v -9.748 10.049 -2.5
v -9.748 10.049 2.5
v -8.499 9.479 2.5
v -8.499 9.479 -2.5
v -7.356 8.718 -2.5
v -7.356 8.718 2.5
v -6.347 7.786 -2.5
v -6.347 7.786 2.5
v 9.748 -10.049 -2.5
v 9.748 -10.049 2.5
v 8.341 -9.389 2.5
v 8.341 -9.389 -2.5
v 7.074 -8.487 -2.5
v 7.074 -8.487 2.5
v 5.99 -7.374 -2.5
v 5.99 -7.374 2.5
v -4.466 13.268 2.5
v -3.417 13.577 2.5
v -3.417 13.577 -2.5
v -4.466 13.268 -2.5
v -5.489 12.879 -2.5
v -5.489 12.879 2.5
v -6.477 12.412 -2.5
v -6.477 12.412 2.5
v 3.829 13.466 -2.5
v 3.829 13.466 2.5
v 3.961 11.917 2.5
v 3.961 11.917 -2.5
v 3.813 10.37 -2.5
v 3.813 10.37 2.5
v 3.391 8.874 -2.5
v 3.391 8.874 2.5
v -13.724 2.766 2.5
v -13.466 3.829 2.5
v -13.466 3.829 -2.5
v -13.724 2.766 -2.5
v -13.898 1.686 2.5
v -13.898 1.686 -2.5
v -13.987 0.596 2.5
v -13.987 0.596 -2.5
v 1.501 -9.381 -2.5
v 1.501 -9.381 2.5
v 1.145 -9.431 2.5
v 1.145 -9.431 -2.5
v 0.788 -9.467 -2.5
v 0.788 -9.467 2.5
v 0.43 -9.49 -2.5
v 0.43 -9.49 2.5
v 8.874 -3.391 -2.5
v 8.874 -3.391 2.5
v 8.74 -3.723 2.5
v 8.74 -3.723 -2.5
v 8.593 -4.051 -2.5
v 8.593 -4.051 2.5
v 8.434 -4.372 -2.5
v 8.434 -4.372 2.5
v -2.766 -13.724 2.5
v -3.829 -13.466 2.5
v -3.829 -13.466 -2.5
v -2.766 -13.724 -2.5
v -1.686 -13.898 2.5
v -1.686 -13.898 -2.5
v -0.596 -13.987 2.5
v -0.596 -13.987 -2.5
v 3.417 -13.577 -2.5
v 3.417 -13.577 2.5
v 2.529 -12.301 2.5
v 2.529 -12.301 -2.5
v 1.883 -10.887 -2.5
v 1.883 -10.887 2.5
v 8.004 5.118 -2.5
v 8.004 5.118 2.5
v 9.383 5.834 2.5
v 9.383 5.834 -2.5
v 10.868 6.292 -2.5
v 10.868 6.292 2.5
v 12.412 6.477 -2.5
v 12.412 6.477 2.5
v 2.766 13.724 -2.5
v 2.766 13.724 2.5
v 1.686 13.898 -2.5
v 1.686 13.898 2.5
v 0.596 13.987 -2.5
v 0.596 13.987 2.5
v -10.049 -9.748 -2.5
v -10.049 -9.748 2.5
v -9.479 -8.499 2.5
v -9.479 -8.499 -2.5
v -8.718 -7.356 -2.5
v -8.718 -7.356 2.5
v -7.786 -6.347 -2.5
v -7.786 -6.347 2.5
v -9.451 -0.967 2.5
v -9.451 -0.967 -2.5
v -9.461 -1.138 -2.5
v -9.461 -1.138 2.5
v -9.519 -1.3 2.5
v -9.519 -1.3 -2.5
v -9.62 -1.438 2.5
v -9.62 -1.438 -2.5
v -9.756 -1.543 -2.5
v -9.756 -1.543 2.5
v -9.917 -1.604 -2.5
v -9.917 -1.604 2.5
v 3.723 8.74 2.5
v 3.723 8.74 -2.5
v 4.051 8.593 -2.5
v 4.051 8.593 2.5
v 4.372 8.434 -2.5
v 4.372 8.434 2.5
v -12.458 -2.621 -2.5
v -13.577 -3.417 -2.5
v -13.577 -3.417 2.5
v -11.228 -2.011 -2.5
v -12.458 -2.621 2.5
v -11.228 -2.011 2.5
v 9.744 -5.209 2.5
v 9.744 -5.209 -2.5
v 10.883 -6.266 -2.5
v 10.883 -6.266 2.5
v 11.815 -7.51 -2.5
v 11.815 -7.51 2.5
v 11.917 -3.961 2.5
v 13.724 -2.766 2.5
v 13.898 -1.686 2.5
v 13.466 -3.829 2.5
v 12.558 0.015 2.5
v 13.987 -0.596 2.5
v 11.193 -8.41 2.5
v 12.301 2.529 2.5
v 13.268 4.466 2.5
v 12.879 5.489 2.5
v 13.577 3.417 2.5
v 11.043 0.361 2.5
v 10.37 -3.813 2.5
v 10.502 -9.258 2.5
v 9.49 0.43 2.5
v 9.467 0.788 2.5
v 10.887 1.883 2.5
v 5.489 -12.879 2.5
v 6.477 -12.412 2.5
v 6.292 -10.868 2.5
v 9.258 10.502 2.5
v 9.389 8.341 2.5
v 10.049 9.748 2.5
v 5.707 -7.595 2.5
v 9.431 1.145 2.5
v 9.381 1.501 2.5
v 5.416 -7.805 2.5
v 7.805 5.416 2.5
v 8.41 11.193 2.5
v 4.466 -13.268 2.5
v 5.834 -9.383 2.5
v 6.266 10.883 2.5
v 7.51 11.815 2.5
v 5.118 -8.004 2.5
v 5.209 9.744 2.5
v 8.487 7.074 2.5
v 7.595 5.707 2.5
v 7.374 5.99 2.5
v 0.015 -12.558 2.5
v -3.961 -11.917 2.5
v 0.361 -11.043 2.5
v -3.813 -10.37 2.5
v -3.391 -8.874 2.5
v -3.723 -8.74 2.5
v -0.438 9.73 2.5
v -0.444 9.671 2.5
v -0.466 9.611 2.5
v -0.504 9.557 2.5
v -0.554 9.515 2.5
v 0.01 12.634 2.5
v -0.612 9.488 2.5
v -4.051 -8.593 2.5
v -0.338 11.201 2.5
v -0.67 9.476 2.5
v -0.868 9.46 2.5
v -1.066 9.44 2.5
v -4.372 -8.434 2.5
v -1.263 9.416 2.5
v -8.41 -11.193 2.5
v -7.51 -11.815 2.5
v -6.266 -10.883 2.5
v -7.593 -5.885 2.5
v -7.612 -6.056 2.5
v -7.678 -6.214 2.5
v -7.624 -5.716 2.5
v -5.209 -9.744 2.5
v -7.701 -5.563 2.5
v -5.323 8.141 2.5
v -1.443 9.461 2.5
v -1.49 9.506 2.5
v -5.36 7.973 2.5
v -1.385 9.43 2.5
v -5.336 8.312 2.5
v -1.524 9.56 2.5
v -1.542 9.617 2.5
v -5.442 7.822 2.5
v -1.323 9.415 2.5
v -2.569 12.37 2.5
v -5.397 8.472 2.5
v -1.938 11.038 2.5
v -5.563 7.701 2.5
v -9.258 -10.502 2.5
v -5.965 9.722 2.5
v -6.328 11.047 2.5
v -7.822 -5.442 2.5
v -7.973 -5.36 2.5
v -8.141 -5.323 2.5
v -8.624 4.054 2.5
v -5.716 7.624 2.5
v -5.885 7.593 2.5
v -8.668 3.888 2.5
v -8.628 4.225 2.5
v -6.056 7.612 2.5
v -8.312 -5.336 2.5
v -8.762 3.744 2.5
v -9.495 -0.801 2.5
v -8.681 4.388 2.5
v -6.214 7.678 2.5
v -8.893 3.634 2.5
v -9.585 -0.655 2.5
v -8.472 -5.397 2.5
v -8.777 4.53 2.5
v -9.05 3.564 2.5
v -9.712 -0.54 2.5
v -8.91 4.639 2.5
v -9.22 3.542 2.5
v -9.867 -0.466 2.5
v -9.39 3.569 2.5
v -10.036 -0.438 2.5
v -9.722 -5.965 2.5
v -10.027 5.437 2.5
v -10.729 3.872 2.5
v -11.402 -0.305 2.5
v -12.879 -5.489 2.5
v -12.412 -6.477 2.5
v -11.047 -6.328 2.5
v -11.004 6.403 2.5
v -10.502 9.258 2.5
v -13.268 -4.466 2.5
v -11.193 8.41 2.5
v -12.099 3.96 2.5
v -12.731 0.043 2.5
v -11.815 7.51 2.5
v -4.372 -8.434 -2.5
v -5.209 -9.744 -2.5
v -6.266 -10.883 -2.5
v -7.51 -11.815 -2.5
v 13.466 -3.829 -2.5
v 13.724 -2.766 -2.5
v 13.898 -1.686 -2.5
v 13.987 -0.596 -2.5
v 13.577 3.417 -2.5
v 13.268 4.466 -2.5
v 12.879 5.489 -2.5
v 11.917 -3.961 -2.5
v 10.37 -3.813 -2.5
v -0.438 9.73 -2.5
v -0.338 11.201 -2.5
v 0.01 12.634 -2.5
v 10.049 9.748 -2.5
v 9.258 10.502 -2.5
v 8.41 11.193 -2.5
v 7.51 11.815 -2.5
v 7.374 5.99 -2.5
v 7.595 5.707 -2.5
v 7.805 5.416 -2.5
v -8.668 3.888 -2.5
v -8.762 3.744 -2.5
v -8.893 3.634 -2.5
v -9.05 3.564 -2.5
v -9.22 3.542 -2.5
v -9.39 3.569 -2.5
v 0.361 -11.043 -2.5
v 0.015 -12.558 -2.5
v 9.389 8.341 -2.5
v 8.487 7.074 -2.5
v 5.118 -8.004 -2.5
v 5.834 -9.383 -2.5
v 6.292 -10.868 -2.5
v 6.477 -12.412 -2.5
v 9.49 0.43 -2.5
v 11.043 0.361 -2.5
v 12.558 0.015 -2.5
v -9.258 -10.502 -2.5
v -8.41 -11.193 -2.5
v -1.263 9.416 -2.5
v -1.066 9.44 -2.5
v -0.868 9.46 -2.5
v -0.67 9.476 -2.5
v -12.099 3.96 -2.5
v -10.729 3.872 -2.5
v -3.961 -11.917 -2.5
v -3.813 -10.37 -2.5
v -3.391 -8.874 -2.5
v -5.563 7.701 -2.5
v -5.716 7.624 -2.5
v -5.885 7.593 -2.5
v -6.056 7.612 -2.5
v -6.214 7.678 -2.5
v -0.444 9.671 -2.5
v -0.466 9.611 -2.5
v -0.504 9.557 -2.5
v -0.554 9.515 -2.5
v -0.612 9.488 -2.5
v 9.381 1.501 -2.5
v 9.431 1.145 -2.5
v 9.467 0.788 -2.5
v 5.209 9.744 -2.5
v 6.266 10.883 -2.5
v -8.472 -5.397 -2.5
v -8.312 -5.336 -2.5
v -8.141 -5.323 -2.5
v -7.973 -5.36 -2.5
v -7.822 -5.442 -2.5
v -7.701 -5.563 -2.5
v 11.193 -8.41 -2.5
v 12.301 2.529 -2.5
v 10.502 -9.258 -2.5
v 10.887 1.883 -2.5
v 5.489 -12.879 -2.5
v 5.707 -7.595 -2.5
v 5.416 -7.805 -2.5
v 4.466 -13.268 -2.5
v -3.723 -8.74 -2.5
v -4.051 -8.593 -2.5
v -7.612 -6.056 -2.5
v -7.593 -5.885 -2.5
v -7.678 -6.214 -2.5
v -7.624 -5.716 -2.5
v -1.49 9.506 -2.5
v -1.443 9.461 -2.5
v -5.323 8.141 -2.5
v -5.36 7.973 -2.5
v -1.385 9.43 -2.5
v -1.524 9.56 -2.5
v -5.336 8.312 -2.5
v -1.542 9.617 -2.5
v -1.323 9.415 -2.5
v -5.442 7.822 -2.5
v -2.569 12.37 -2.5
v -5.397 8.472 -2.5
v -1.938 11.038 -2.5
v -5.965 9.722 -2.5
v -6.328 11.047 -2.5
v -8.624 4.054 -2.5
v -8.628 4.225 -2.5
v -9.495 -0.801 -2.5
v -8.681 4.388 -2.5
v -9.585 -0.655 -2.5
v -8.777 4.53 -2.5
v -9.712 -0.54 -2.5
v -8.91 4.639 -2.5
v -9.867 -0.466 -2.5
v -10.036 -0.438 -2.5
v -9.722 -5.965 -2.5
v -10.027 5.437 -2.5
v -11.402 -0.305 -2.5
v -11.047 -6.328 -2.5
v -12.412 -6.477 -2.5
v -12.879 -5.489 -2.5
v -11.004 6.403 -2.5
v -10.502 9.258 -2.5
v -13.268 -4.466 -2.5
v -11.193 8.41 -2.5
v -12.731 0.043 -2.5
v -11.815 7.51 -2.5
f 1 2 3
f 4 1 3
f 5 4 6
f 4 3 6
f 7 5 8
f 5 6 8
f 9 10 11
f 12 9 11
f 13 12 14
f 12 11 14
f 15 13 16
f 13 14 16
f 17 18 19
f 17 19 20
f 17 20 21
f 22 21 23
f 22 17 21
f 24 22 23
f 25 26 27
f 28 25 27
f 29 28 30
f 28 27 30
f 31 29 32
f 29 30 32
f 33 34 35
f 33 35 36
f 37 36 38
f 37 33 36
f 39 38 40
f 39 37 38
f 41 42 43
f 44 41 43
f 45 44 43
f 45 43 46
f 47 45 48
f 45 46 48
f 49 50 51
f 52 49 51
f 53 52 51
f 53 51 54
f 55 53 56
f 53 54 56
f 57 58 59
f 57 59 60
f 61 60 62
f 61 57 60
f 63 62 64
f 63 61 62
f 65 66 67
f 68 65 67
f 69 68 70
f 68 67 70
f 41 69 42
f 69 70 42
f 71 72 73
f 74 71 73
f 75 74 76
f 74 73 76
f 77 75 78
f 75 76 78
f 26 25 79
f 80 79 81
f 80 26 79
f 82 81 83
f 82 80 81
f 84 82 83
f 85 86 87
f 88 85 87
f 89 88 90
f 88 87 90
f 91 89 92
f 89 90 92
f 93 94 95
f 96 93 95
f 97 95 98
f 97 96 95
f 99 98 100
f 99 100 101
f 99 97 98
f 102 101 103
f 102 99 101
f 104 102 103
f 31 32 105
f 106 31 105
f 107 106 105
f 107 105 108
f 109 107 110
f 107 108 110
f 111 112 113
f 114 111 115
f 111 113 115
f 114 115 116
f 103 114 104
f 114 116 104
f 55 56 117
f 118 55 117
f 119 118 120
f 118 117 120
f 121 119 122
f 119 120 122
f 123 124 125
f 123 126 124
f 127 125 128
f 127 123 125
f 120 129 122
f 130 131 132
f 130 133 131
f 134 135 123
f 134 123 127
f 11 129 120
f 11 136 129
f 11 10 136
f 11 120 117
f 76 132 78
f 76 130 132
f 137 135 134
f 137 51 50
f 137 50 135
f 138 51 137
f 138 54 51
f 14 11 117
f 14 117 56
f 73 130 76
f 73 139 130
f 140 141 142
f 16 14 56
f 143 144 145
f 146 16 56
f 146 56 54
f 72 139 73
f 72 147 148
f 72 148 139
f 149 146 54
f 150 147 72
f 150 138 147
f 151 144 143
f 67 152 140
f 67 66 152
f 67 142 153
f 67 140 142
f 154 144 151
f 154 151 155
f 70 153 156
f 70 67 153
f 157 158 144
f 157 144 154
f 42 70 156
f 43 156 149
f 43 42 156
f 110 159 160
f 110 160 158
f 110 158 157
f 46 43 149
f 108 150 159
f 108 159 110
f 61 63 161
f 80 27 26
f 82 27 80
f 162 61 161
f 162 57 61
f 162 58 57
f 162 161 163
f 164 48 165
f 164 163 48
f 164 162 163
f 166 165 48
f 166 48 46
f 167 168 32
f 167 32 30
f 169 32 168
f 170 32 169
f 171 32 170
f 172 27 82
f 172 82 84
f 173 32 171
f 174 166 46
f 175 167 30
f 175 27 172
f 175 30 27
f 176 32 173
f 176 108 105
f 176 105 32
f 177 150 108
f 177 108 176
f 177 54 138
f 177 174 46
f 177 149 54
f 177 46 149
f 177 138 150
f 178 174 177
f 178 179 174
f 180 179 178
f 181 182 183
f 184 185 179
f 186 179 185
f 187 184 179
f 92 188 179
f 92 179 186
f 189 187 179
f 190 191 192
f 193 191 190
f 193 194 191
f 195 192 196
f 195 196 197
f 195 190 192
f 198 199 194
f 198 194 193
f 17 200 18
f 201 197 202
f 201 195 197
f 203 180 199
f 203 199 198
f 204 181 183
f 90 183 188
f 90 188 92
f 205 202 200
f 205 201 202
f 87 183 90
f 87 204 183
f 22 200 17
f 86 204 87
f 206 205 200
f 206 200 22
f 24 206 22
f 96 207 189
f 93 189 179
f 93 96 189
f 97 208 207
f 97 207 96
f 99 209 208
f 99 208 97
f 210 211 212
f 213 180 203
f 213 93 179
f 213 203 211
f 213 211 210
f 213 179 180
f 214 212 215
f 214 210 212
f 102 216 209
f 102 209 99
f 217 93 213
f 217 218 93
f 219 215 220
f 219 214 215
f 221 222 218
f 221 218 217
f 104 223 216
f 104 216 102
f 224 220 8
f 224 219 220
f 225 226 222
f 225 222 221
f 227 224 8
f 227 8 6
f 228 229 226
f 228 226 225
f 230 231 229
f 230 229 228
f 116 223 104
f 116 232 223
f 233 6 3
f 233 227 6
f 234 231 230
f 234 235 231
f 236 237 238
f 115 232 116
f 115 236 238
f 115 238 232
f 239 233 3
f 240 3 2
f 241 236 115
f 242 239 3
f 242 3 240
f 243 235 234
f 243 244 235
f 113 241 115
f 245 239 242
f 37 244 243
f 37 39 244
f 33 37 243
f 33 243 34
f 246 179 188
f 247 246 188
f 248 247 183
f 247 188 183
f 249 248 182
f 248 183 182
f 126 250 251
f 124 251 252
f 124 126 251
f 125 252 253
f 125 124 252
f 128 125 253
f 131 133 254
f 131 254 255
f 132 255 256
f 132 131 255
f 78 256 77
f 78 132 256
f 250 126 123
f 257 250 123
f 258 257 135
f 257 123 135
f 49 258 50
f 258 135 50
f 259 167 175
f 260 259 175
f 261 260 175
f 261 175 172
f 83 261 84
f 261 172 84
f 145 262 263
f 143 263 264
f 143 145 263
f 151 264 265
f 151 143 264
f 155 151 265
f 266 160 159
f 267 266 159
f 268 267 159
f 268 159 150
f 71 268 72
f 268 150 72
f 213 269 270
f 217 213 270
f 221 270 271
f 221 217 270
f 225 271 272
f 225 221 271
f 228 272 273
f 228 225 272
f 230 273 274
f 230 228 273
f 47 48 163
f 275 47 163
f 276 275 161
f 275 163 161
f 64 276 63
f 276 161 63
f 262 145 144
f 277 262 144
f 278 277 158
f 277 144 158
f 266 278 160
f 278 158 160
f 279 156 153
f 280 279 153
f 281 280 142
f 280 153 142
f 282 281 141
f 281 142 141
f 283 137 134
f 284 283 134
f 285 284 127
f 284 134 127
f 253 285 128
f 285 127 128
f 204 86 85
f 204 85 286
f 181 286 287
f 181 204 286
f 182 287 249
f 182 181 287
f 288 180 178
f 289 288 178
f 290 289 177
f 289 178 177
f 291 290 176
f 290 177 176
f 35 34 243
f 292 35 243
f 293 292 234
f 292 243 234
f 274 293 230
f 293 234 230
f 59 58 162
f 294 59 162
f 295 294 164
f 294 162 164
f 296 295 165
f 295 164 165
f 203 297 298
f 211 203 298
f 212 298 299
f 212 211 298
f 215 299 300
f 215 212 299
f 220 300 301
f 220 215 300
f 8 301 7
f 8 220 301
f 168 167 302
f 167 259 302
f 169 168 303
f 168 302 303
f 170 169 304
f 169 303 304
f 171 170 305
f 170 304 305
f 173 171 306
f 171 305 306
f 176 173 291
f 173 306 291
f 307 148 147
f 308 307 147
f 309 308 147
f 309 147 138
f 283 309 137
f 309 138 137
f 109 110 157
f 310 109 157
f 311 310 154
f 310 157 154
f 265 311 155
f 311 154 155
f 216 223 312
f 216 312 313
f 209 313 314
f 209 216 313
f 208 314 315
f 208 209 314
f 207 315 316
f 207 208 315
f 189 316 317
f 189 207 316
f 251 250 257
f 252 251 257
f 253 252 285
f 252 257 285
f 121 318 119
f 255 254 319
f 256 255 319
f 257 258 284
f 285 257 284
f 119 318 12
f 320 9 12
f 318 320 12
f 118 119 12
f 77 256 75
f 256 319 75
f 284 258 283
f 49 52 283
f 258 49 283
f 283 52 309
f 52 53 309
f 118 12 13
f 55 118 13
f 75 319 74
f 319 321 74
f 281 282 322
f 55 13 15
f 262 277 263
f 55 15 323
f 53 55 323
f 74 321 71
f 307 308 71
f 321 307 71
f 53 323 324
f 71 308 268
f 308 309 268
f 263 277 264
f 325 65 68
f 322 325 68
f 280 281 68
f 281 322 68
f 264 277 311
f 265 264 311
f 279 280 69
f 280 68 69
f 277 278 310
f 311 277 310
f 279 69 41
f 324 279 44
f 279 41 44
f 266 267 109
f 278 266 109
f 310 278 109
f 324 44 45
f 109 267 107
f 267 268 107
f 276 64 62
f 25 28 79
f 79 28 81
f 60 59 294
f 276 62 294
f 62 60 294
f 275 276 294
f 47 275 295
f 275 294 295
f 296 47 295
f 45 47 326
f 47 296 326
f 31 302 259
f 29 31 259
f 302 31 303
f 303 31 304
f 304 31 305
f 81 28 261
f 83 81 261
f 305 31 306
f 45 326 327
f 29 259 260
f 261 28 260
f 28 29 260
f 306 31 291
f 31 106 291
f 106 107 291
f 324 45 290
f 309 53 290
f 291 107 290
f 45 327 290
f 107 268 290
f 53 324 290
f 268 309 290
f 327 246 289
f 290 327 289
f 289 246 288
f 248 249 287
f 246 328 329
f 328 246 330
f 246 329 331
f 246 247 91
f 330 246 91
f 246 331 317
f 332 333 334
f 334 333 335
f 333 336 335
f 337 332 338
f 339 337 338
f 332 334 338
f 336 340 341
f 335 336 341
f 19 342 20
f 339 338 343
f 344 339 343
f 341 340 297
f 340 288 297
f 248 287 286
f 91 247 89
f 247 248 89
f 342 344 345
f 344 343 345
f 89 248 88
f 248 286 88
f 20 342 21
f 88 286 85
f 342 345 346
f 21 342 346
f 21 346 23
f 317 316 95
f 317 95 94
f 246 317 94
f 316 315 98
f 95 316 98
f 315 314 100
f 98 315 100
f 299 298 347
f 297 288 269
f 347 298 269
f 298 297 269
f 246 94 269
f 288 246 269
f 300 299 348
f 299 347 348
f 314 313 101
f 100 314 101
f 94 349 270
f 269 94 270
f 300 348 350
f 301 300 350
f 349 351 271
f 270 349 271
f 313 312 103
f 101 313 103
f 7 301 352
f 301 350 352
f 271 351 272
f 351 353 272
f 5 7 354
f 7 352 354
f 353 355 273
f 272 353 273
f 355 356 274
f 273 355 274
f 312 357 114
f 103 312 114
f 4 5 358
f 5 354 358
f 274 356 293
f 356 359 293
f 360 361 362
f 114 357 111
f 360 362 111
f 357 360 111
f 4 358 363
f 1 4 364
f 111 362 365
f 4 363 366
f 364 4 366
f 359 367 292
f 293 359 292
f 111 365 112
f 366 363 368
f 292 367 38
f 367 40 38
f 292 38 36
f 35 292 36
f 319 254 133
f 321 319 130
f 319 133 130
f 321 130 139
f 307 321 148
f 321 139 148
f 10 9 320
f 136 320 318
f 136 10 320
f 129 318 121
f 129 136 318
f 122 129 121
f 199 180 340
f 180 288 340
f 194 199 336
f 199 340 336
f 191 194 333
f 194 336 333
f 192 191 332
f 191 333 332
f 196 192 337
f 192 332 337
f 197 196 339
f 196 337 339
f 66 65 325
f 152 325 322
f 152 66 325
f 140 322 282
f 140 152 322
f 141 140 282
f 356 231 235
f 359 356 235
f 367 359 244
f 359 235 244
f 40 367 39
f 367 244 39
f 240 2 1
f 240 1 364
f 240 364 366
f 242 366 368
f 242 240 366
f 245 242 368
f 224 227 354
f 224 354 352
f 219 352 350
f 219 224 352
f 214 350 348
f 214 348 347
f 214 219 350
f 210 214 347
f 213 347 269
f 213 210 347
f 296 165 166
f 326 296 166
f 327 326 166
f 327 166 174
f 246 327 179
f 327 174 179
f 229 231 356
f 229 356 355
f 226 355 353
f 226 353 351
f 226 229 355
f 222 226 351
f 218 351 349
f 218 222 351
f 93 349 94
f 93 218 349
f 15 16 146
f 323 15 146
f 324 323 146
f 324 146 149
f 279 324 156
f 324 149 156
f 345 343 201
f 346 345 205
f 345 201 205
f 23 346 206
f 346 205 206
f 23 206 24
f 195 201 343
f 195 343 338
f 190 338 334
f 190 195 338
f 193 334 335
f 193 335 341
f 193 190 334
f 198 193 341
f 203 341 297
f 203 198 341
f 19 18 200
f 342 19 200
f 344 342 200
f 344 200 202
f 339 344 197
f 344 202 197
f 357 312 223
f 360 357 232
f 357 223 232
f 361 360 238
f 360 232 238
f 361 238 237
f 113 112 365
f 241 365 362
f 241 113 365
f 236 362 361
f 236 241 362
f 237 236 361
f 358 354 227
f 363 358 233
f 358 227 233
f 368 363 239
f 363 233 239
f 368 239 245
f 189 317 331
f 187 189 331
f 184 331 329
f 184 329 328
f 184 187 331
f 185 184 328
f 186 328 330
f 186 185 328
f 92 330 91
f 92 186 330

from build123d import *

# Parameters (mm, degrees)
SKETCH1_R           = 14
BOSS_EXTRUDE1_DEPTH = 2.5
CUT_EXTRUDE1_START  = 21.420577857
CUT_EXTRUDE1_DEPTH  = 26.420577857
FILLET1_R           = 0.25
CIRPATTERN1_COUNT   = 12
FILLET2_R           = 0.6
FILLET3_R           = 0.6
FILLET4_R           = 0.6
FILLET5_R           = 0.6


with BuildPart() as part:
    # Sketch1 → Boss-Extrude1 (new, symmetric)
    with BuildSketch(Plane.XY):
        Circle(SKETCH1_R)
    extrude(amount=BOSS_EXTRUDE1_DEPTH, both=True)

    # Sketch2 → Cut-Extrude1 (cut)
    with BuildSketch(Plane.XY.offset(2.5).offset(CUT_EXTRUDE1_START)):
        with BuildLine():
            ThreePointArc((-0.430438648, 9.490243546), (-0.222226767, 11.808448469), (0.596346311, 13.987293201))
            ThreePointArc((0.596346311, 13.987293201), (-1.425202617, 13.927268128), (-3.417009435, 13.576599225))
            ThreePointArc((-3.417009435, 13.576599225), (-2.174093588, 11.608710395), (-1.50066187, 9.380725662))
            ThreePointArc((-1.50066187, 9.380725662), (-0.967101776, 9.450646229), (-0.430438648, 9.490243546))
        make_face()
    cut_extrude1 = extrude(amount=-CUT_EXTRUDE1_DEPTH, mode=Mode.SUBTRACT)

    # Fillet1
    fillet1_edges = [part.edges().sort_by_distance(p)[0] for p in [
        (-1.50066187, 9.380725662, 0),
        (-0.430438648, 9.490243546, 0),
    ]]
    fillet(fillet1_edges, radius=FILLET1_R)

    # CirPattern1: Cut-Extrude1 ×12 about axis
    cirpattern1_axis = Axis((0, 0, 2.5), (0, 0, 1))
    for i in range(1, CIRPATTERN1_COUNT):
        add(cut_extrude1.rotate(cirpattern1_axis, i * 360 / CIRPATTERN1_COUNT), mode=Mode.SUBTRACT)

    # Fillet2
    # the kernel refuses this fillet: 0.6 mm, written as the material it adds along each edge
    with BuildSketch(Plane(origin=(-5.989974133, 7.373615794, 2.5), x_dir=(-0.6546840177965881, 0.7559026636027397, 0), z_dir=(0, 0, -1))) as fillet2_piece_1:
        with BuildLine():
            CenterArc((0.564611753, 0.599701652), FILLET2_R, 185.108089024, 83.084978973)
            ThreePointArc((-0.03300535, 0.546280701), (-0.012568085, 0.273378072), (0, 0))
            ThreePointArc((0, 0), (0.272846371, 0.004302723), (0.545692742, 0))
        make_face()
    extrude(amount=5)
    with BuildSketch(Plane(origin=(-5.117892577, 8.003572675, 2.5), x_dir=(-0.8266142951027914, -0.5627688754113143, 0), z_dir=(0, 0, -1))) as fillet2_piece_2:
        with BuildLine():
            CenterArc((0.564559284, 0.599751046), FILLET2_R, 185.264442517, 83.084978973)
            ThreePointArc((-0.032909815, 0.54469947), (-0.012160017, 0.272609225), (0, 0))
            ThreePointArc((0, 0), (0.273638428, 0.003941765), (0.547276857, 0))
        make_face()
    extrude(amount=5)

    # Fillet3
    # the kernel refuses this fillet: 0.6 mm, written as the material it adds along each edge
    with BuildSketch(Plane(origin=(-8.874277665, 3.390751529, 2.5), x_dir=(-0.9449243226648774, 0.3272889005700054, 0), z_dir=(0, 0, -1))) as fillet3_piece_1:
        with BuildLine():
            CenterArc((0.564611753, 0.599701652), FILLET3_R, 185.108089024, 83.084978973)
            ThreePointArc((-0.03300535, 0.546280701), (-0.012568085, 0.273378072), (0, 0))
            ThreePointArc((0, 0), (0.272846371, 0.004302723), (0.545692742, 0))
        make_face()
    extrude(amount=5)
    with BuildSketch(Plane(origin=(-8.434011323, 4.372350969, 2.5), x_dir=(-0.4344845409847307, -0.9006792901167916, 0), z_dir=(0, 0, -1))) as fillet3_piece_2:
        with BuildLine():
            CenterArc((0.564559284, 0.599751046), FILLET3_R, 185.264442517, 83.084978973)
            ThreePointArc((-0.032909815, 0.54469947), (-0.012160017, 0.272609225), (0, 0))
            ThreePointArc((0, 0), (0.273638428, 0.003941765), (0.547276857, 0))
        make_face()
    extrude(amount=5)

    # Fillet4
    # the kernel refuses this fillet: 0.6 mm, written as the material it adds along each edge
    with BuildSketch(Plane(origin=(-9.380725662, -1.50066187, 2.5), x_dir=(-0.9819729183665902, -0.18902165906213533, 0), z_dir=(0, 0, -1))) as fillet4_piece_1:
        with BuildLine():
            CenterArc((0.564611753, 0.599701652), FILLET4_R, 185.108089024, 83.084978973)
            ThreePointArc((-0.03300535, 0.546280701), (-0.012568085, 0.273378072), (0, 0))
            ThreePointArc((0, 0), (0.272846371, 0.004302723), (0.545692742, 0))
        make_face()
    extrude(amount=5)
    with BuildSketch(Plane(origin=(-9.490243546, -0.430438648, 2.5), x_dir=(0.07406499501400296, -0.997253416396041, 0), z_dir=(0, 0, -1))) as fillet4_piece_2:
        with BuildLine():
            CenterArc((0.564559284, 0.599751046), FILLET4_R, 185.264442517, 83.084978973)
            ThreePointArc((-0.032909815, 0.54469947), (-0.012160017, 0.272609225), (0, 0))
            ThreePointArc((0, 0), (0.273638428, 0.003941765), (0.547276857, 0))
        make_face()
    extrude(amount=5)

    # Fillet5
    # the kernel refuses this fillet: 0.6 mm, written as the material it adds along each edge
    with BuildSketch(Plane(origin=(-7.373615794, -5.989974133, 2.5), x_dir=(-0.7559026636027405, -0.6546840177965871, 0), z_dir=(0, 0, -1))) as fillet5_piece_1:
        with BuildLine():
            CenterArc((0.564611753, 0.599701652), FILLET5_R, 185.108089024, 83.084978973)
            ThreePointArc((-0.03300535, 0.546280701), (-0.012568085, 0.273378072), (0, 0))
            ThreePointArc((0, 0), (0.272846371, 0.004302723), (0.545692742, 0))
        make_face()
    extrude(amount=5)
    with BuildSketch(Plane(origin=(-8.003572675, -5.117892577, 2.5), x_dir=(0.562768875411312, -0.8266142951027928, 0), z_dir=(0, 0, -1))) as fillet5_piece_2:
        with BuildLine():
            CenterArc((0.564559284, 0.599751046), FILLET5_R, 185.264442517, 83.084978973)
            ThreePointArc((-0.032909815, 0.54469947), (-0.012160017, 0.272609225), (0, 0))
            ThreePointArc((0, 0), (0.273638428, 0.003941765), (0.547276857, 0))
        make_face()
    extrude(amount=5)


solid = part.part
